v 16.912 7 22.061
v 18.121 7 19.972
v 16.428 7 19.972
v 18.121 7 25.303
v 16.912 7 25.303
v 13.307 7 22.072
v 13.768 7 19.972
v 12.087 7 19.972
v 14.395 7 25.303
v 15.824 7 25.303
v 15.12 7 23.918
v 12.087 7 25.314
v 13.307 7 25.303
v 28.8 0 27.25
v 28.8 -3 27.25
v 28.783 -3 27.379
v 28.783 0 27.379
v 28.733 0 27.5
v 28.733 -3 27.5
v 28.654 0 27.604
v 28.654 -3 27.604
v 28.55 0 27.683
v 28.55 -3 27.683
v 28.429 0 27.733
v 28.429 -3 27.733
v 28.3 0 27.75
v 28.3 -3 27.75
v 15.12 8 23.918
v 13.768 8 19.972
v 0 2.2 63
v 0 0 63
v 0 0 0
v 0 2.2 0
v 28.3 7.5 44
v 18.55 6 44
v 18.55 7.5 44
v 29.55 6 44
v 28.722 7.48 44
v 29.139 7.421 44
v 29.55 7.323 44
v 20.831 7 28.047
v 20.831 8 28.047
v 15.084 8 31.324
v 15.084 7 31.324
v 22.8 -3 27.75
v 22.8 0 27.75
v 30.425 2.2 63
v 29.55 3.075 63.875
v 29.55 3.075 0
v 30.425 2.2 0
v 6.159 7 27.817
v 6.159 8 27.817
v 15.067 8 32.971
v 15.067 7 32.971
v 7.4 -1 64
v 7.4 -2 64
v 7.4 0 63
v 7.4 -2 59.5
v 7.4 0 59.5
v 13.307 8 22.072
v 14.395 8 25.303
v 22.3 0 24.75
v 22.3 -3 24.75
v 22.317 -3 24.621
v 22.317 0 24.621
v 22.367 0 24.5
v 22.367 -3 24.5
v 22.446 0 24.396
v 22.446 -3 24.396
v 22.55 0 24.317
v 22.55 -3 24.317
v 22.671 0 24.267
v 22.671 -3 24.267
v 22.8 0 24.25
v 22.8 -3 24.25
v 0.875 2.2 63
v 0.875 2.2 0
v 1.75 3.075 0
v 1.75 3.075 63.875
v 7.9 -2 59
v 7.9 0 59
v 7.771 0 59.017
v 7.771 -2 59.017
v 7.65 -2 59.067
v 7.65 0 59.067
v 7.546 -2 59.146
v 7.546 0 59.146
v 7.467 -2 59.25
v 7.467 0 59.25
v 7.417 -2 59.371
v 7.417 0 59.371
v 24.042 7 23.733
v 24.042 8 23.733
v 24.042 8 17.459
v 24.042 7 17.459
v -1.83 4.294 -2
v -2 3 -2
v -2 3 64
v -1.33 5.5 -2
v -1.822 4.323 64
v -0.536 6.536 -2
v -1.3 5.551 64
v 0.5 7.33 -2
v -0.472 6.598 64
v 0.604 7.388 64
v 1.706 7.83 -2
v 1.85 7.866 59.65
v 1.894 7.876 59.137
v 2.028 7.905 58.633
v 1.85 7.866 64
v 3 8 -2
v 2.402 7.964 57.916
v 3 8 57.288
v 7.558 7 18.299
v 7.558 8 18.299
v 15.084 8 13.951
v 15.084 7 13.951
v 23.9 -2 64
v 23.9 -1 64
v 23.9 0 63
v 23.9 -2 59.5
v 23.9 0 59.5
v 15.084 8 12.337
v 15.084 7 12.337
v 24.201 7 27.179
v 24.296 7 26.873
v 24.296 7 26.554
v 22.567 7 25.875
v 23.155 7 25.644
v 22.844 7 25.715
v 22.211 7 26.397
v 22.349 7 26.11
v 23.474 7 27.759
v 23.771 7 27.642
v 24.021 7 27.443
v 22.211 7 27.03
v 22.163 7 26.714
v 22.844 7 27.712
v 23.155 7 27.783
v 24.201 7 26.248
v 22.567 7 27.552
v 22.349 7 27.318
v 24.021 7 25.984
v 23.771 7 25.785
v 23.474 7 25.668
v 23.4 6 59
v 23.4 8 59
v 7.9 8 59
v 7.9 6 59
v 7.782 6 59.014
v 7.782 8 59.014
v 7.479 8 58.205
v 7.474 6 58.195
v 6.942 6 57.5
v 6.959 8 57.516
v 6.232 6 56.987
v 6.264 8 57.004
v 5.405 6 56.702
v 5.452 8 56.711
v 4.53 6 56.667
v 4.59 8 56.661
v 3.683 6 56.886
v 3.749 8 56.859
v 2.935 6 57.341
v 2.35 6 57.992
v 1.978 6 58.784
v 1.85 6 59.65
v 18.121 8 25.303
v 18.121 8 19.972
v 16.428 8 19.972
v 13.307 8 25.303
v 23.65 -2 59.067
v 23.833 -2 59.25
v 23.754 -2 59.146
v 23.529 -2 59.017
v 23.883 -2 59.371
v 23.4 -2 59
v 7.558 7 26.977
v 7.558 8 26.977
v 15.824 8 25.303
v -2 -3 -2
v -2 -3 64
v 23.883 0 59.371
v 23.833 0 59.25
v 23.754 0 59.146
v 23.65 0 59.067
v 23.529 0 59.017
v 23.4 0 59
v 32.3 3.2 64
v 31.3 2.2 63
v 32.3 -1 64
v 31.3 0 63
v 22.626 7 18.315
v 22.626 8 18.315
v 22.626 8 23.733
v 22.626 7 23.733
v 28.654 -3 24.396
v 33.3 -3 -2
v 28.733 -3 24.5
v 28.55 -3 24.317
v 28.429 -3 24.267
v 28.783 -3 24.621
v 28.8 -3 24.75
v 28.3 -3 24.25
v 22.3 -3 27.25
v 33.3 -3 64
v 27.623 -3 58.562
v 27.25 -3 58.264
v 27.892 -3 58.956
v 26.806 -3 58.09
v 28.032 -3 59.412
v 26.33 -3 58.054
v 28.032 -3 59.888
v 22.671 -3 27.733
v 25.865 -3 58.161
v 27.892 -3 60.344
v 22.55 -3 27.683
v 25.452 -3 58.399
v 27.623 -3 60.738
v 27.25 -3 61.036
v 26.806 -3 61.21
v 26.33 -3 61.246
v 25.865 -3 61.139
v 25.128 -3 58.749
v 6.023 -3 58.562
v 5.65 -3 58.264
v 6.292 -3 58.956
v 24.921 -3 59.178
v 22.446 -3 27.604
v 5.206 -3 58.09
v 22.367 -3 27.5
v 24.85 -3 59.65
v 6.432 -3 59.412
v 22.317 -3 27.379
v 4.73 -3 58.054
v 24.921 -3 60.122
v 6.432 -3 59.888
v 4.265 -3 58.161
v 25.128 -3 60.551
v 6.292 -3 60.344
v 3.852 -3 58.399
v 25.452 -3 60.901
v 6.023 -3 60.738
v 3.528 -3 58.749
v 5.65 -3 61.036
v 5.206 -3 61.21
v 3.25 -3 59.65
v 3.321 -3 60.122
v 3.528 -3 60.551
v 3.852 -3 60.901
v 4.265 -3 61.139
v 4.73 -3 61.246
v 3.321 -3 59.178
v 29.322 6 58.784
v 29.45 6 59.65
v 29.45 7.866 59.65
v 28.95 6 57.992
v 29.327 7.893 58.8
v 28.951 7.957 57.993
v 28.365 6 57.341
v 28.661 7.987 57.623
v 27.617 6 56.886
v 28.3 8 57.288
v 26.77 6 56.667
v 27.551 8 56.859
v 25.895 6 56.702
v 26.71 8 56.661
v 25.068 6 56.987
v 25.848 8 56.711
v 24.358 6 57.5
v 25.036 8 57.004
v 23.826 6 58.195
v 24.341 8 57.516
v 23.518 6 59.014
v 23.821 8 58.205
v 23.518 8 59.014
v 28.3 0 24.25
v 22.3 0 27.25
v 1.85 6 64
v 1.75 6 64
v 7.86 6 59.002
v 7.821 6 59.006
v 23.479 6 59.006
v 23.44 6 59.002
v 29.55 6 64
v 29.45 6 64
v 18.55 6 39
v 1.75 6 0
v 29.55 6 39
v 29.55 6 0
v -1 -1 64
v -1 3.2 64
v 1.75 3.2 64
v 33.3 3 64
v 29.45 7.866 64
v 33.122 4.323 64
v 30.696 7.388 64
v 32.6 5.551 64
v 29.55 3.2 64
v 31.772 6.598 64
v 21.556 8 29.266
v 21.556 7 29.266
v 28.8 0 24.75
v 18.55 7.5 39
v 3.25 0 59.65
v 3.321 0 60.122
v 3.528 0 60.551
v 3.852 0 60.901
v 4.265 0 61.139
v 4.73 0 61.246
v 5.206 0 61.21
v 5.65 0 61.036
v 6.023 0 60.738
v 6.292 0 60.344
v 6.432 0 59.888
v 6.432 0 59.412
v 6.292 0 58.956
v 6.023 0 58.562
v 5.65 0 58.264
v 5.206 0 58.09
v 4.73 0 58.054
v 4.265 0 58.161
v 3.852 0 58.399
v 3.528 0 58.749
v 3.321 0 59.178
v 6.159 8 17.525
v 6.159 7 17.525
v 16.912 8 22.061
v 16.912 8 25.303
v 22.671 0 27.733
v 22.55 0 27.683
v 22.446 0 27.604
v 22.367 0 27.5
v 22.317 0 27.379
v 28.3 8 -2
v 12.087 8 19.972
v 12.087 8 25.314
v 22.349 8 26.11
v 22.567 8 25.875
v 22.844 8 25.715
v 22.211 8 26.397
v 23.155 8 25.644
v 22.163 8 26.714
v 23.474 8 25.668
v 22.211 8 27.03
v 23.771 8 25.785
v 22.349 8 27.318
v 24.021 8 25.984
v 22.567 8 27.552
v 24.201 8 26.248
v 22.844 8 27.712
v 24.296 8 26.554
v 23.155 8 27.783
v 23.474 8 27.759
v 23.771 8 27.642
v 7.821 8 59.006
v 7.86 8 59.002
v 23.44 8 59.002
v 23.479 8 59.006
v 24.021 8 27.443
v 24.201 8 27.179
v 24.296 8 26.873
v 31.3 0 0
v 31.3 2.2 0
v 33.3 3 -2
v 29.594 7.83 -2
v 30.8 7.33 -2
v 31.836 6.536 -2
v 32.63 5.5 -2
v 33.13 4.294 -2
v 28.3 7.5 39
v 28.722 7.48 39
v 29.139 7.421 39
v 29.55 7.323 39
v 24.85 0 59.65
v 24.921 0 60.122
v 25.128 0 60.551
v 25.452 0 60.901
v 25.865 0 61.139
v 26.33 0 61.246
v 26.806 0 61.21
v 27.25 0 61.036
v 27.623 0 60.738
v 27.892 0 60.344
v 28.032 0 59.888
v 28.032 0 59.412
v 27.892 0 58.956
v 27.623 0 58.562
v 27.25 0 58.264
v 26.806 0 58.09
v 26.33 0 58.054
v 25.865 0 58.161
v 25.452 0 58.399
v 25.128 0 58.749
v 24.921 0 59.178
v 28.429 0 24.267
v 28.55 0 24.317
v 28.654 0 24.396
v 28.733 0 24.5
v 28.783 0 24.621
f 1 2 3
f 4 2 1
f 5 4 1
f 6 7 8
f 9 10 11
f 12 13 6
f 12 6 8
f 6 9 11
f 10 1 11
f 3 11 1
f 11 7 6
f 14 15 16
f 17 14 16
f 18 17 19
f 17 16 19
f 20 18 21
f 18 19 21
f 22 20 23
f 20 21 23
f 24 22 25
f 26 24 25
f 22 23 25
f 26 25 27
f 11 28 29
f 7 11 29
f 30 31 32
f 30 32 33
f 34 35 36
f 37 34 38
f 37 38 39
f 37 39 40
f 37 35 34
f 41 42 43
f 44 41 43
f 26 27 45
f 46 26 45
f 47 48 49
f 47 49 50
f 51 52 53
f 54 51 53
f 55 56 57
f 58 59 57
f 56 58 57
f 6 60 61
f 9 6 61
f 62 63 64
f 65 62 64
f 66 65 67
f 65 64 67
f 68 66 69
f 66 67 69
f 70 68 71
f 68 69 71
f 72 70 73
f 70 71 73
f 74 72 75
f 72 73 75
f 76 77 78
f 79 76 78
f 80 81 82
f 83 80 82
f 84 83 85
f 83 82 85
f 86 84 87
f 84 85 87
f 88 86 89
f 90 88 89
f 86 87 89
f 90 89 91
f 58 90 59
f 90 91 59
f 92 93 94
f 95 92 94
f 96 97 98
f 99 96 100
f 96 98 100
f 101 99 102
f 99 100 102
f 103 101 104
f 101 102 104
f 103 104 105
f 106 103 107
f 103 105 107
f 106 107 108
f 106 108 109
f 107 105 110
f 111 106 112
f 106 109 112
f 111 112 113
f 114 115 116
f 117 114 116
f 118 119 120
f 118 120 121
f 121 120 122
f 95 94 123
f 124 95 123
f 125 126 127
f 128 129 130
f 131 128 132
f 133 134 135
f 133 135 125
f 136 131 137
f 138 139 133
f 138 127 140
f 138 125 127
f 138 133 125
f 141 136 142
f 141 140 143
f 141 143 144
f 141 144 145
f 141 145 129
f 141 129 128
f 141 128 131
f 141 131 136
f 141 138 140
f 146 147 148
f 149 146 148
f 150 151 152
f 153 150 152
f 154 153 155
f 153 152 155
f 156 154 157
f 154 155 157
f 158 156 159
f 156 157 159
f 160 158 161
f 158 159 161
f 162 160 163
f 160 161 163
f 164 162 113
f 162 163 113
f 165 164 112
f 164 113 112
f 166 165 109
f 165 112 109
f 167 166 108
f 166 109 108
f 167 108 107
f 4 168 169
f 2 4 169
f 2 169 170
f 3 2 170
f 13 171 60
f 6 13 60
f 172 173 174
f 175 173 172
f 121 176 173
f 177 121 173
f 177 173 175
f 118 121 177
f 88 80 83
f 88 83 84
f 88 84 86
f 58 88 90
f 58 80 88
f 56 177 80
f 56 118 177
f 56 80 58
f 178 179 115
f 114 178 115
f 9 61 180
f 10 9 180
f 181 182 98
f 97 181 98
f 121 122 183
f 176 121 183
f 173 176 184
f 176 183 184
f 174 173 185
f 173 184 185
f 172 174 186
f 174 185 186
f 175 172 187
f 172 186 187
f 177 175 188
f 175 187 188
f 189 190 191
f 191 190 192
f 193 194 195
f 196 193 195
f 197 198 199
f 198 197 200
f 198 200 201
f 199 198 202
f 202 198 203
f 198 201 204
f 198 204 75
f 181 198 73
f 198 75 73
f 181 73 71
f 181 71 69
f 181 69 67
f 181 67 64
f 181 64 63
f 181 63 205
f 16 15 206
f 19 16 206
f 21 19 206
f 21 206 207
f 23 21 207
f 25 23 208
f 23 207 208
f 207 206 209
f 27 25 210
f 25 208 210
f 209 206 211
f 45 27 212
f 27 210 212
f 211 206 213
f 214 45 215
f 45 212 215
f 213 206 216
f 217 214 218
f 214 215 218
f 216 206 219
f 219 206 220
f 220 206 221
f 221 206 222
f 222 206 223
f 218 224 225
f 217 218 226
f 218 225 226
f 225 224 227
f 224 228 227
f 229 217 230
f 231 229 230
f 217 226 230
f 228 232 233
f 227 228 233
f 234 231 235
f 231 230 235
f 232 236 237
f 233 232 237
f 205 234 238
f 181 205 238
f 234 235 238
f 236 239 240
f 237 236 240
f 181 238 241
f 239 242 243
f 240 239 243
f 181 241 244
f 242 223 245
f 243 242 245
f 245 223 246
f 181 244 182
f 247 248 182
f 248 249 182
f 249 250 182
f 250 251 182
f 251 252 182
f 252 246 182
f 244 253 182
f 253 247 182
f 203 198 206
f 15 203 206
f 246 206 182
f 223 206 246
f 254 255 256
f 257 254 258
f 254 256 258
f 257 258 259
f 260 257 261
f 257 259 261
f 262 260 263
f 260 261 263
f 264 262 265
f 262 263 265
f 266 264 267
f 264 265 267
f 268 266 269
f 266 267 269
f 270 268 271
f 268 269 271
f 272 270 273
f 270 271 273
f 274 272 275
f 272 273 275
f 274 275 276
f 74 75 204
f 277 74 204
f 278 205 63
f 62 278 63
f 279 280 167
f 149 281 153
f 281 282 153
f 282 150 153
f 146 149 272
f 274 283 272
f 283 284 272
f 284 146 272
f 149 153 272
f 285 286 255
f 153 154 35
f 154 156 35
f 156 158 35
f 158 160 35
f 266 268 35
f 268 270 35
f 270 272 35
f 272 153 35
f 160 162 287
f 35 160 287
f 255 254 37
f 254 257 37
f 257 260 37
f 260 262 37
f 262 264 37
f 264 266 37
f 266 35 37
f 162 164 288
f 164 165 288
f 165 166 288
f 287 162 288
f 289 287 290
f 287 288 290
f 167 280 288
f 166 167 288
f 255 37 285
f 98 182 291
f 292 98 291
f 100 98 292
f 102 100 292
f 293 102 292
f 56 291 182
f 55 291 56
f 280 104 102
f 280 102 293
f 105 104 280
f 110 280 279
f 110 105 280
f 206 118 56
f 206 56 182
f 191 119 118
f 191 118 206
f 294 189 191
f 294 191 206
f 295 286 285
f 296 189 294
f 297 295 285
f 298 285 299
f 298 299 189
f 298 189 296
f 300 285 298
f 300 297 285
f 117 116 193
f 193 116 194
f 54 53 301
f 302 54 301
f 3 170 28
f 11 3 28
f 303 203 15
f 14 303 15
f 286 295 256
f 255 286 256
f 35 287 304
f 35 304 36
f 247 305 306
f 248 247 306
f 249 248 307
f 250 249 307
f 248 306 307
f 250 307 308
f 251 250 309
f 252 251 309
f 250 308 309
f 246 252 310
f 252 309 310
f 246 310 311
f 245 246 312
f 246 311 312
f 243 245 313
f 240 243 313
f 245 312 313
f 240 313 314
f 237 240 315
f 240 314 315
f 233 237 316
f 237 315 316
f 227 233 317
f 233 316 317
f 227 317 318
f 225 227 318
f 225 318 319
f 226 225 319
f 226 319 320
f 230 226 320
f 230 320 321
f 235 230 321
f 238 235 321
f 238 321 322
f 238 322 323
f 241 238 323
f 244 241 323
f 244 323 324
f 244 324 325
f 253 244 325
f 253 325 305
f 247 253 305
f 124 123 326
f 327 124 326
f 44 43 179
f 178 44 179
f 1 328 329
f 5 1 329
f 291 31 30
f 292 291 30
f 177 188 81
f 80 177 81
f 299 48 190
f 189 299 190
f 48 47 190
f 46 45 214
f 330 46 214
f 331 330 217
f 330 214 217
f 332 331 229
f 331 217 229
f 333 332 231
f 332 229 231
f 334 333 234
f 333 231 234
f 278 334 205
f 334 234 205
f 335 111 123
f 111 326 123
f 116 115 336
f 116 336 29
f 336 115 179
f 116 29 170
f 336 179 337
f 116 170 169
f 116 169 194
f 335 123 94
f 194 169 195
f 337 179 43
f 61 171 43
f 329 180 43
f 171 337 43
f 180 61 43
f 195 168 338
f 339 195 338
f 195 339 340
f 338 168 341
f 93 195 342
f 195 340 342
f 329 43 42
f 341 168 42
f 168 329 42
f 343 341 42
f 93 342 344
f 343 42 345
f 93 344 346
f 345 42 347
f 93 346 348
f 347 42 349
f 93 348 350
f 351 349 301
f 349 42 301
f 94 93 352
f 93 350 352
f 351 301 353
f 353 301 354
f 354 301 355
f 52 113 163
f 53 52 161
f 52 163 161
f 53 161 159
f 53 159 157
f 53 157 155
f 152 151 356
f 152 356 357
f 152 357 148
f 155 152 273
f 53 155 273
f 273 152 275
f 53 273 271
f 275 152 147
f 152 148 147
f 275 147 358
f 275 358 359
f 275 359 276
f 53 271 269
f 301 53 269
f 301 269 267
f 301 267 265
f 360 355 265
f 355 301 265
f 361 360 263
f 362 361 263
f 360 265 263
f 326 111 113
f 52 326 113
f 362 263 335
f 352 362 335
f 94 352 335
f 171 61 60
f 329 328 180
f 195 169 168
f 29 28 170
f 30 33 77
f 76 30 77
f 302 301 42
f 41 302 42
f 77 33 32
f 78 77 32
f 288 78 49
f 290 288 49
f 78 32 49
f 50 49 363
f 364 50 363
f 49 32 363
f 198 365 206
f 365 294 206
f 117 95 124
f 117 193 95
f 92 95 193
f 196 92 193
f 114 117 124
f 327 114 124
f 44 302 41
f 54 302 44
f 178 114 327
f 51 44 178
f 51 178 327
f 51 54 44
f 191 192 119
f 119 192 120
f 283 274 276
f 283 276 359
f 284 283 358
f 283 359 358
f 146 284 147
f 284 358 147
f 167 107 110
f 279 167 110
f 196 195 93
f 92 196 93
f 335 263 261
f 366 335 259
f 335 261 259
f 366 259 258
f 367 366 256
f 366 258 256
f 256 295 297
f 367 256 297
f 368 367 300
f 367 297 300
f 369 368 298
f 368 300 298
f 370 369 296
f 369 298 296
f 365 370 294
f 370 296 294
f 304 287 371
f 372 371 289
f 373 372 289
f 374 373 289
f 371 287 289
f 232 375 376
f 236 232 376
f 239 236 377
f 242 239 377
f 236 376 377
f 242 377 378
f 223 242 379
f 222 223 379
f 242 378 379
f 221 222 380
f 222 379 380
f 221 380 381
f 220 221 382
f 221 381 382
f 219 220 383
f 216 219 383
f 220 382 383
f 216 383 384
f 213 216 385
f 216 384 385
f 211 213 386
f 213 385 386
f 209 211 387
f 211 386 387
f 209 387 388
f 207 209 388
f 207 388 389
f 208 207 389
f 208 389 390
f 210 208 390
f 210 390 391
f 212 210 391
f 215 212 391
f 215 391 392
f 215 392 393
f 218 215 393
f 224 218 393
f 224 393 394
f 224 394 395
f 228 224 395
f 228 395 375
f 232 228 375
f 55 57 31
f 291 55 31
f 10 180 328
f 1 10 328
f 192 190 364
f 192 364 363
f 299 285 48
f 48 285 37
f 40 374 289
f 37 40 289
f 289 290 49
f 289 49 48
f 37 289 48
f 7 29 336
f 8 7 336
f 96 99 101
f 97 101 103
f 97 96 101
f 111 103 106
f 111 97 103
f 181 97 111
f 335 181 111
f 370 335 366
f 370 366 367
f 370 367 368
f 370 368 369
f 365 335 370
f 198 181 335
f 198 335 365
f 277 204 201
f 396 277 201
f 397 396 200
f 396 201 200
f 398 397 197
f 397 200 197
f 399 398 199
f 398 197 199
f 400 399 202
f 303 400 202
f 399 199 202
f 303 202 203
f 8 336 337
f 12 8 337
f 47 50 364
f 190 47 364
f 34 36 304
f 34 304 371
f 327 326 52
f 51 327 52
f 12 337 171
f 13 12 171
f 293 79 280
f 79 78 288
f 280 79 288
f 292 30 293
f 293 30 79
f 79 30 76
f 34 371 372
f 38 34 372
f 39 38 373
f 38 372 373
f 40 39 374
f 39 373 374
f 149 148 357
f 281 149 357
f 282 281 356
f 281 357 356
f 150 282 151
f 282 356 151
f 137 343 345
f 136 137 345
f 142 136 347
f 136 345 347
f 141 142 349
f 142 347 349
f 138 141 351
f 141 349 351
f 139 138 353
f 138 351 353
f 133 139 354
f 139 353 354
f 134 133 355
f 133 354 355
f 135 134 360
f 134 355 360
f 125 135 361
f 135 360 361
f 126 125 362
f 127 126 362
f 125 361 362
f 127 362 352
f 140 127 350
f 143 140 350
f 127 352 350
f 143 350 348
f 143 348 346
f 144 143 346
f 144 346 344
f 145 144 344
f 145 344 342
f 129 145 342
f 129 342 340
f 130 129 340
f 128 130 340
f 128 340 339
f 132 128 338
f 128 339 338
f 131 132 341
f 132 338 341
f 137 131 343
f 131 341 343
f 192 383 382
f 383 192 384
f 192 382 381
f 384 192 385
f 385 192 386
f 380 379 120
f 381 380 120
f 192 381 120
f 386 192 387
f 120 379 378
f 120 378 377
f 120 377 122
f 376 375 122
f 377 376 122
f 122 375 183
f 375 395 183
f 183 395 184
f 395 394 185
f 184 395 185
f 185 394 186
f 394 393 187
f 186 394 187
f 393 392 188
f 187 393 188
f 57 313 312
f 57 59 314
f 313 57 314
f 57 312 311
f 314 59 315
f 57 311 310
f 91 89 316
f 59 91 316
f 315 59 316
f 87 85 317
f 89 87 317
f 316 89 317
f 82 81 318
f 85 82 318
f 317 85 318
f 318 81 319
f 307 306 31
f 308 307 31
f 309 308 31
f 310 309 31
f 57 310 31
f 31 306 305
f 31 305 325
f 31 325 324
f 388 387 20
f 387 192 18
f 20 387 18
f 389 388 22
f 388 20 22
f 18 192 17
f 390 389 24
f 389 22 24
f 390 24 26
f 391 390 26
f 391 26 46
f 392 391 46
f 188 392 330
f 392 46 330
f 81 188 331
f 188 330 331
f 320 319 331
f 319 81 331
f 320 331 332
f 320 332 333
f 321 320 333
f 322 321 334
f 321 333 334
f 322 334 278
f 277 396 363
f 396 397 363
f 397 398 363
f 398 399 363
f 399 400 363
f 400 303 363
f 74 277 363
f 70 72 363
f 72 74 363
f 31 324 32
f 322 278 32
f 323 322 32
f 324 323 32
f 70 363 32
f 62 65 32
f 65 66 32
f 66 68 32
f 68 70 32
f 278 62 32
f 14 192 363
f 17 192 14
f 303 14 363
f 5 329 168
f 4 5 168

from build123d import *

# Parameters (mm, degrees)
F1_DEPTH  = 64
F3_DEPTH  = 2
F5_DEPTH  = 2
F7_DEPTH  = 2
F9_DEPTH  = 2
F10_SIZE  = 1
F11_R     = 1.6
F12_DEPTH = 3.001
F13_W     = 11
F13_H     = 5
F14_DEPTH = 1.5
F16_DEPTH = 5
F17_R     = 1.072280415
F18_DEPTH = 1
F20_DEPTH = 3


with BuildPart() as f1:
    # F0 (on Top) → F1 (new body)
    with BuildSketch(Plane.XY):
        with BuildLine():
            Line((28.3, 8), (15.65, 8))
            Line((15.65, 8), (3, 8))
            ThreePointArc((3, 8), (-0.5355339059, 6.5355339059), (-2, 3))
            Line((-2, 3), (-2, -3))
            Line((-2, -3), (15.65, -3))
            Line((15.65, -3), (33.3, -3))
            Line((33.3, -3), (33.3, 3))
            ThreePointArc((33.3, 3), (31.8355339059, 6.5355339059), (28.3, 8))
        make_face()
        Polygon((15.65, 0), (0, 0), (0, 2.2), (0.875, 2.2), (1.75, 3.075), (1.75, 6), (15.65, 6), (29.55, 6), (29.55, 3.075), (30.425, 2.2), (31.3, 2.2), (31.3, 0), align=None, mode=Mode.SUBTRACT)
    extrude(amount=F1_DEPTH)

    # F2 (on face) → F3 (join)
    with BuildSketch(Plane(origin=(0, 0, 0), x_dir=(1, 0, 0), z_dir=(0, 0, -1))):
        with BuildLine():
            ThreePointArc((-2, -3), (-0.5355339059, -6.5355339059), (3, -8))
            Line((3, -8), (28.3, -8))
            ThreePointArc((28.3, -8), (31.8355339059, -6.5355339059), (33.3, -3))
            Line((33.3, -3), (33.3, 3))
            Line((33.3, 3), (-2, 3))
            Line((-2, 3), (-2, -3))
        make_face()
    extrude(amount=F3_DEPTH)

    # F4 (on face) → F5 (cut, through all)
    with BuildSketch(Plane(origin=(0, 8, 0), x_dir=(-1, 0, 0), z_dir=(0, 1, 0))):
        with BuildLine():
            Line((-7.4, 59.5), (-7.4, 64))
            Line((-7.4, 64), (-15.65, 64))
            Line((-15.65, 64), (-23.9, 64))
            Line((-23.9, 64), (-23.9, 59.5))
            ThreePointArc((-23.9, 59.5), (-23.7535533906, 59.1464466094), (-23.4, 59))
            Line((-23.4, 59), (-15.65, 59))
            Line((-15.65, 59), (-7.9, 59))
            ThreePointArc((-7.9, 59), (-7.5464466094, 59.1464466094), (-7.4, 59.5))
        make_face()
    extrude(amount=-F5_DEPTH, mode=Mode.SUBTRACT)

    # F6 (on face) → F7 (cut, through all)
    with BuildSketch(Plane(origin=(0, 8, 0), x_dir=(-1, 0, 0), z_dir=(0, 1, 0))):
        with BuildLine():
            Line((-7.85, 64.5738318563), (-7.85, 59.65))
            ThreePointArc((-7.85, 59.65), (-4.85, 56.65), (-1.85, 59.65))
            Line((-1.85, 59.65), (-1.85, 64.5738318563))
            Line((-1.85, 64.5738318563), (-7.85, 64.5738318563))
        make_face()
        with BuildLine():
            ThreePointArc((-29.45, 59.65), (-26.45, 56.65), (-23.45, 59.65))
            Line((-23.45, 59.65), (-23.45, 64.5738318563))
            Line((-23.45, 64.5738318563), (-29.45, 64.5738318563))
            Line((-29.45, 64.5738318563), (-29.45, 59.65))
        make_face()
    extrude(amount=-F7_DEPTH, mode=Mode.SUBTRACT)

    # F8 (on face) → F9 (cut)
    with BuildSketch(Plane(origin=(0, 0, 0), x_dir=(-1, 0, 0), z_dir=(0, 1, 0))):
        with BuildLine():
            Line((-7.4, 59.5), (-7.4, 64))
            Line((-7.4, 64), (-15.65, 64))
            Line((-15.65, 64), (-23.9, 64))
            Line((-23.9, 64), (-23.9, 59.5))
            ThreePointArc((-23.9, 59.5), (-23.7535533906, 59.1464466094), (-23.4, 59))
            Line((-23.4, 59), (-15.65, 59))
            Line((-15.65, 59), (-7.9, 59))
            ThreePointArc((-7.9, 59), (-7.5464466094, 59.1464466094), (-7.4, 59.5))
        make_face()
    extrude(amount=-F9_DEPTH, mode=Mode.SUBTRACT)

    # F10
    f10_edges = [f1.edges().sort_by_distance(p)[0] for p in [
        (3.7, 0, 64),
        (27.6, 0, 64),
        (0, 1.1, 64),
        (0.4375, 2.2, 64),
        (31.3, 1.1, 64),
        (30.8625, 2.2, 64),
    ]]
    chamfer(f10_edges, length=F10_SIZE)

    # F11 (on face) → F12 (cut, through all)
    with BuildSketch(Plane(origin=(0, 0, 0), x_dir=(-1, 0, 0), z_dir=(0, 1, 0))):
        with Locations((-4.85, 59.65)):
            Circle(F11_R)
        with Locations((-26.45, 59.65)):
            Circle(F11_R)
    extrude(amount=-F12_DEPTH, mode=Mode.SUBTRACT)

    # F13 (on face) → F14 (cut)
    with BuildSketch(Plane.XZ.offset(-6)):
        with Locations((24.05, 41.5)):
            Rectangle(F13_W, F13_H)
    extrude(amount=-F14_DEPTH, mode=Mode.SUBTRACT)

    # F15 (on face) → F16 (join, through all)
    with BuildSketch(Plane.XY.offset(39)):
        with BuildLine():
            Line((29.55, 7.5), (28.3, 7.5))
            ThreePointArc((28.3, 7.5), (28.9312414261, 7.4555060613), (29.55, 7.3229041164))
            Line((29.55, 7.3229041164), (29.55, 7.5))
        make_face()
    extrude(amount=F16_DEPTH)

    # F17 (on face) → F18 (cut)
    with BuildSketch(Plane(origin=(0, 8, 0), x_dir=(-1, 0, 0), z_dir=(0, 1, 0))):
        Polygon((-15.0674888864, 32.9711548984), (-21.5556509793, 29.2659867555), (-20.8310857415, 28.0473995954), (-15.0839583948, 31.324416399), (-7.55834952, 26.9770175219), (-7.55834952, 18.298689276), (-15.0839583948, 13.9512922615), (-22.6260330528, 18.3151569217), (-22.6260330528, 23.7329360098), (-24.0422300994, 23.7329360098), (-24.0422300994, 17.4588505179), (-15.0839565322, 12.3374853283), (-6.1586168595, 17.5247211009), (-6.1586168595, 27.8168544173), align=None)
        with Locations((-23.2353284955, 26.7135389149)):
            Circle(F17_R)
        Polygon((-12.0868515223, 19.9723746628), (-12.0868515223, 25.3138449043), (-13.3068170398, 25.3028552979), (-13.3068170398, 22.0715943724), (-14.3948951736, 25.3028552979), (-15.8236827701, 25.3028552979), (-16.9117599726, 22.060604766), (-16.9117599726, 25.3028552979), (-18.1207358837, 25.3028552979), (-18.1207358837, 19.9723746628), (-16.4281707257, 19.9723746628), (-15.1202799752, 23.9180289209), (-13.7684261426, 19.9723746628), align=None)
    extrude(amount=-F18_DEPTH, mode=Mode.SUBTRACT)

    # F19 (on face) → F20 (cut, through all)
    with BuildSketch(Plane.XZ.offset(3)):
        with BuildLine():
            Line((28.3, 27.75), (22.8, 27.75))
            ThreePointArc((22.8, 27.75), (22.4464466094, 27.6035533906), (22.3, 27.25))
            Line((22.3, 27.25), (22.3, 24.75))
            ThreePointArc((22.3, 24.75), (22.4464466094, 24.3964466094), (22.8, 24.25))
            Line((22.8, 24.25), (28.3, 24.25))
            ThreePointArc((28.3, 24.25), (28.6535533906, 24.3964466094), (28.8, 24.75))
            Line((28.8, 24.75), (28.8, 27.25))
            ThreePointArc((28.8, 27.25), (28.6535533906, 27.6035533906), (28.3, 27.75))
        make_face()
    extrude(amount=-F20_DEPTH, mode=Mode.SUBTRACT)


solid = f1.part
